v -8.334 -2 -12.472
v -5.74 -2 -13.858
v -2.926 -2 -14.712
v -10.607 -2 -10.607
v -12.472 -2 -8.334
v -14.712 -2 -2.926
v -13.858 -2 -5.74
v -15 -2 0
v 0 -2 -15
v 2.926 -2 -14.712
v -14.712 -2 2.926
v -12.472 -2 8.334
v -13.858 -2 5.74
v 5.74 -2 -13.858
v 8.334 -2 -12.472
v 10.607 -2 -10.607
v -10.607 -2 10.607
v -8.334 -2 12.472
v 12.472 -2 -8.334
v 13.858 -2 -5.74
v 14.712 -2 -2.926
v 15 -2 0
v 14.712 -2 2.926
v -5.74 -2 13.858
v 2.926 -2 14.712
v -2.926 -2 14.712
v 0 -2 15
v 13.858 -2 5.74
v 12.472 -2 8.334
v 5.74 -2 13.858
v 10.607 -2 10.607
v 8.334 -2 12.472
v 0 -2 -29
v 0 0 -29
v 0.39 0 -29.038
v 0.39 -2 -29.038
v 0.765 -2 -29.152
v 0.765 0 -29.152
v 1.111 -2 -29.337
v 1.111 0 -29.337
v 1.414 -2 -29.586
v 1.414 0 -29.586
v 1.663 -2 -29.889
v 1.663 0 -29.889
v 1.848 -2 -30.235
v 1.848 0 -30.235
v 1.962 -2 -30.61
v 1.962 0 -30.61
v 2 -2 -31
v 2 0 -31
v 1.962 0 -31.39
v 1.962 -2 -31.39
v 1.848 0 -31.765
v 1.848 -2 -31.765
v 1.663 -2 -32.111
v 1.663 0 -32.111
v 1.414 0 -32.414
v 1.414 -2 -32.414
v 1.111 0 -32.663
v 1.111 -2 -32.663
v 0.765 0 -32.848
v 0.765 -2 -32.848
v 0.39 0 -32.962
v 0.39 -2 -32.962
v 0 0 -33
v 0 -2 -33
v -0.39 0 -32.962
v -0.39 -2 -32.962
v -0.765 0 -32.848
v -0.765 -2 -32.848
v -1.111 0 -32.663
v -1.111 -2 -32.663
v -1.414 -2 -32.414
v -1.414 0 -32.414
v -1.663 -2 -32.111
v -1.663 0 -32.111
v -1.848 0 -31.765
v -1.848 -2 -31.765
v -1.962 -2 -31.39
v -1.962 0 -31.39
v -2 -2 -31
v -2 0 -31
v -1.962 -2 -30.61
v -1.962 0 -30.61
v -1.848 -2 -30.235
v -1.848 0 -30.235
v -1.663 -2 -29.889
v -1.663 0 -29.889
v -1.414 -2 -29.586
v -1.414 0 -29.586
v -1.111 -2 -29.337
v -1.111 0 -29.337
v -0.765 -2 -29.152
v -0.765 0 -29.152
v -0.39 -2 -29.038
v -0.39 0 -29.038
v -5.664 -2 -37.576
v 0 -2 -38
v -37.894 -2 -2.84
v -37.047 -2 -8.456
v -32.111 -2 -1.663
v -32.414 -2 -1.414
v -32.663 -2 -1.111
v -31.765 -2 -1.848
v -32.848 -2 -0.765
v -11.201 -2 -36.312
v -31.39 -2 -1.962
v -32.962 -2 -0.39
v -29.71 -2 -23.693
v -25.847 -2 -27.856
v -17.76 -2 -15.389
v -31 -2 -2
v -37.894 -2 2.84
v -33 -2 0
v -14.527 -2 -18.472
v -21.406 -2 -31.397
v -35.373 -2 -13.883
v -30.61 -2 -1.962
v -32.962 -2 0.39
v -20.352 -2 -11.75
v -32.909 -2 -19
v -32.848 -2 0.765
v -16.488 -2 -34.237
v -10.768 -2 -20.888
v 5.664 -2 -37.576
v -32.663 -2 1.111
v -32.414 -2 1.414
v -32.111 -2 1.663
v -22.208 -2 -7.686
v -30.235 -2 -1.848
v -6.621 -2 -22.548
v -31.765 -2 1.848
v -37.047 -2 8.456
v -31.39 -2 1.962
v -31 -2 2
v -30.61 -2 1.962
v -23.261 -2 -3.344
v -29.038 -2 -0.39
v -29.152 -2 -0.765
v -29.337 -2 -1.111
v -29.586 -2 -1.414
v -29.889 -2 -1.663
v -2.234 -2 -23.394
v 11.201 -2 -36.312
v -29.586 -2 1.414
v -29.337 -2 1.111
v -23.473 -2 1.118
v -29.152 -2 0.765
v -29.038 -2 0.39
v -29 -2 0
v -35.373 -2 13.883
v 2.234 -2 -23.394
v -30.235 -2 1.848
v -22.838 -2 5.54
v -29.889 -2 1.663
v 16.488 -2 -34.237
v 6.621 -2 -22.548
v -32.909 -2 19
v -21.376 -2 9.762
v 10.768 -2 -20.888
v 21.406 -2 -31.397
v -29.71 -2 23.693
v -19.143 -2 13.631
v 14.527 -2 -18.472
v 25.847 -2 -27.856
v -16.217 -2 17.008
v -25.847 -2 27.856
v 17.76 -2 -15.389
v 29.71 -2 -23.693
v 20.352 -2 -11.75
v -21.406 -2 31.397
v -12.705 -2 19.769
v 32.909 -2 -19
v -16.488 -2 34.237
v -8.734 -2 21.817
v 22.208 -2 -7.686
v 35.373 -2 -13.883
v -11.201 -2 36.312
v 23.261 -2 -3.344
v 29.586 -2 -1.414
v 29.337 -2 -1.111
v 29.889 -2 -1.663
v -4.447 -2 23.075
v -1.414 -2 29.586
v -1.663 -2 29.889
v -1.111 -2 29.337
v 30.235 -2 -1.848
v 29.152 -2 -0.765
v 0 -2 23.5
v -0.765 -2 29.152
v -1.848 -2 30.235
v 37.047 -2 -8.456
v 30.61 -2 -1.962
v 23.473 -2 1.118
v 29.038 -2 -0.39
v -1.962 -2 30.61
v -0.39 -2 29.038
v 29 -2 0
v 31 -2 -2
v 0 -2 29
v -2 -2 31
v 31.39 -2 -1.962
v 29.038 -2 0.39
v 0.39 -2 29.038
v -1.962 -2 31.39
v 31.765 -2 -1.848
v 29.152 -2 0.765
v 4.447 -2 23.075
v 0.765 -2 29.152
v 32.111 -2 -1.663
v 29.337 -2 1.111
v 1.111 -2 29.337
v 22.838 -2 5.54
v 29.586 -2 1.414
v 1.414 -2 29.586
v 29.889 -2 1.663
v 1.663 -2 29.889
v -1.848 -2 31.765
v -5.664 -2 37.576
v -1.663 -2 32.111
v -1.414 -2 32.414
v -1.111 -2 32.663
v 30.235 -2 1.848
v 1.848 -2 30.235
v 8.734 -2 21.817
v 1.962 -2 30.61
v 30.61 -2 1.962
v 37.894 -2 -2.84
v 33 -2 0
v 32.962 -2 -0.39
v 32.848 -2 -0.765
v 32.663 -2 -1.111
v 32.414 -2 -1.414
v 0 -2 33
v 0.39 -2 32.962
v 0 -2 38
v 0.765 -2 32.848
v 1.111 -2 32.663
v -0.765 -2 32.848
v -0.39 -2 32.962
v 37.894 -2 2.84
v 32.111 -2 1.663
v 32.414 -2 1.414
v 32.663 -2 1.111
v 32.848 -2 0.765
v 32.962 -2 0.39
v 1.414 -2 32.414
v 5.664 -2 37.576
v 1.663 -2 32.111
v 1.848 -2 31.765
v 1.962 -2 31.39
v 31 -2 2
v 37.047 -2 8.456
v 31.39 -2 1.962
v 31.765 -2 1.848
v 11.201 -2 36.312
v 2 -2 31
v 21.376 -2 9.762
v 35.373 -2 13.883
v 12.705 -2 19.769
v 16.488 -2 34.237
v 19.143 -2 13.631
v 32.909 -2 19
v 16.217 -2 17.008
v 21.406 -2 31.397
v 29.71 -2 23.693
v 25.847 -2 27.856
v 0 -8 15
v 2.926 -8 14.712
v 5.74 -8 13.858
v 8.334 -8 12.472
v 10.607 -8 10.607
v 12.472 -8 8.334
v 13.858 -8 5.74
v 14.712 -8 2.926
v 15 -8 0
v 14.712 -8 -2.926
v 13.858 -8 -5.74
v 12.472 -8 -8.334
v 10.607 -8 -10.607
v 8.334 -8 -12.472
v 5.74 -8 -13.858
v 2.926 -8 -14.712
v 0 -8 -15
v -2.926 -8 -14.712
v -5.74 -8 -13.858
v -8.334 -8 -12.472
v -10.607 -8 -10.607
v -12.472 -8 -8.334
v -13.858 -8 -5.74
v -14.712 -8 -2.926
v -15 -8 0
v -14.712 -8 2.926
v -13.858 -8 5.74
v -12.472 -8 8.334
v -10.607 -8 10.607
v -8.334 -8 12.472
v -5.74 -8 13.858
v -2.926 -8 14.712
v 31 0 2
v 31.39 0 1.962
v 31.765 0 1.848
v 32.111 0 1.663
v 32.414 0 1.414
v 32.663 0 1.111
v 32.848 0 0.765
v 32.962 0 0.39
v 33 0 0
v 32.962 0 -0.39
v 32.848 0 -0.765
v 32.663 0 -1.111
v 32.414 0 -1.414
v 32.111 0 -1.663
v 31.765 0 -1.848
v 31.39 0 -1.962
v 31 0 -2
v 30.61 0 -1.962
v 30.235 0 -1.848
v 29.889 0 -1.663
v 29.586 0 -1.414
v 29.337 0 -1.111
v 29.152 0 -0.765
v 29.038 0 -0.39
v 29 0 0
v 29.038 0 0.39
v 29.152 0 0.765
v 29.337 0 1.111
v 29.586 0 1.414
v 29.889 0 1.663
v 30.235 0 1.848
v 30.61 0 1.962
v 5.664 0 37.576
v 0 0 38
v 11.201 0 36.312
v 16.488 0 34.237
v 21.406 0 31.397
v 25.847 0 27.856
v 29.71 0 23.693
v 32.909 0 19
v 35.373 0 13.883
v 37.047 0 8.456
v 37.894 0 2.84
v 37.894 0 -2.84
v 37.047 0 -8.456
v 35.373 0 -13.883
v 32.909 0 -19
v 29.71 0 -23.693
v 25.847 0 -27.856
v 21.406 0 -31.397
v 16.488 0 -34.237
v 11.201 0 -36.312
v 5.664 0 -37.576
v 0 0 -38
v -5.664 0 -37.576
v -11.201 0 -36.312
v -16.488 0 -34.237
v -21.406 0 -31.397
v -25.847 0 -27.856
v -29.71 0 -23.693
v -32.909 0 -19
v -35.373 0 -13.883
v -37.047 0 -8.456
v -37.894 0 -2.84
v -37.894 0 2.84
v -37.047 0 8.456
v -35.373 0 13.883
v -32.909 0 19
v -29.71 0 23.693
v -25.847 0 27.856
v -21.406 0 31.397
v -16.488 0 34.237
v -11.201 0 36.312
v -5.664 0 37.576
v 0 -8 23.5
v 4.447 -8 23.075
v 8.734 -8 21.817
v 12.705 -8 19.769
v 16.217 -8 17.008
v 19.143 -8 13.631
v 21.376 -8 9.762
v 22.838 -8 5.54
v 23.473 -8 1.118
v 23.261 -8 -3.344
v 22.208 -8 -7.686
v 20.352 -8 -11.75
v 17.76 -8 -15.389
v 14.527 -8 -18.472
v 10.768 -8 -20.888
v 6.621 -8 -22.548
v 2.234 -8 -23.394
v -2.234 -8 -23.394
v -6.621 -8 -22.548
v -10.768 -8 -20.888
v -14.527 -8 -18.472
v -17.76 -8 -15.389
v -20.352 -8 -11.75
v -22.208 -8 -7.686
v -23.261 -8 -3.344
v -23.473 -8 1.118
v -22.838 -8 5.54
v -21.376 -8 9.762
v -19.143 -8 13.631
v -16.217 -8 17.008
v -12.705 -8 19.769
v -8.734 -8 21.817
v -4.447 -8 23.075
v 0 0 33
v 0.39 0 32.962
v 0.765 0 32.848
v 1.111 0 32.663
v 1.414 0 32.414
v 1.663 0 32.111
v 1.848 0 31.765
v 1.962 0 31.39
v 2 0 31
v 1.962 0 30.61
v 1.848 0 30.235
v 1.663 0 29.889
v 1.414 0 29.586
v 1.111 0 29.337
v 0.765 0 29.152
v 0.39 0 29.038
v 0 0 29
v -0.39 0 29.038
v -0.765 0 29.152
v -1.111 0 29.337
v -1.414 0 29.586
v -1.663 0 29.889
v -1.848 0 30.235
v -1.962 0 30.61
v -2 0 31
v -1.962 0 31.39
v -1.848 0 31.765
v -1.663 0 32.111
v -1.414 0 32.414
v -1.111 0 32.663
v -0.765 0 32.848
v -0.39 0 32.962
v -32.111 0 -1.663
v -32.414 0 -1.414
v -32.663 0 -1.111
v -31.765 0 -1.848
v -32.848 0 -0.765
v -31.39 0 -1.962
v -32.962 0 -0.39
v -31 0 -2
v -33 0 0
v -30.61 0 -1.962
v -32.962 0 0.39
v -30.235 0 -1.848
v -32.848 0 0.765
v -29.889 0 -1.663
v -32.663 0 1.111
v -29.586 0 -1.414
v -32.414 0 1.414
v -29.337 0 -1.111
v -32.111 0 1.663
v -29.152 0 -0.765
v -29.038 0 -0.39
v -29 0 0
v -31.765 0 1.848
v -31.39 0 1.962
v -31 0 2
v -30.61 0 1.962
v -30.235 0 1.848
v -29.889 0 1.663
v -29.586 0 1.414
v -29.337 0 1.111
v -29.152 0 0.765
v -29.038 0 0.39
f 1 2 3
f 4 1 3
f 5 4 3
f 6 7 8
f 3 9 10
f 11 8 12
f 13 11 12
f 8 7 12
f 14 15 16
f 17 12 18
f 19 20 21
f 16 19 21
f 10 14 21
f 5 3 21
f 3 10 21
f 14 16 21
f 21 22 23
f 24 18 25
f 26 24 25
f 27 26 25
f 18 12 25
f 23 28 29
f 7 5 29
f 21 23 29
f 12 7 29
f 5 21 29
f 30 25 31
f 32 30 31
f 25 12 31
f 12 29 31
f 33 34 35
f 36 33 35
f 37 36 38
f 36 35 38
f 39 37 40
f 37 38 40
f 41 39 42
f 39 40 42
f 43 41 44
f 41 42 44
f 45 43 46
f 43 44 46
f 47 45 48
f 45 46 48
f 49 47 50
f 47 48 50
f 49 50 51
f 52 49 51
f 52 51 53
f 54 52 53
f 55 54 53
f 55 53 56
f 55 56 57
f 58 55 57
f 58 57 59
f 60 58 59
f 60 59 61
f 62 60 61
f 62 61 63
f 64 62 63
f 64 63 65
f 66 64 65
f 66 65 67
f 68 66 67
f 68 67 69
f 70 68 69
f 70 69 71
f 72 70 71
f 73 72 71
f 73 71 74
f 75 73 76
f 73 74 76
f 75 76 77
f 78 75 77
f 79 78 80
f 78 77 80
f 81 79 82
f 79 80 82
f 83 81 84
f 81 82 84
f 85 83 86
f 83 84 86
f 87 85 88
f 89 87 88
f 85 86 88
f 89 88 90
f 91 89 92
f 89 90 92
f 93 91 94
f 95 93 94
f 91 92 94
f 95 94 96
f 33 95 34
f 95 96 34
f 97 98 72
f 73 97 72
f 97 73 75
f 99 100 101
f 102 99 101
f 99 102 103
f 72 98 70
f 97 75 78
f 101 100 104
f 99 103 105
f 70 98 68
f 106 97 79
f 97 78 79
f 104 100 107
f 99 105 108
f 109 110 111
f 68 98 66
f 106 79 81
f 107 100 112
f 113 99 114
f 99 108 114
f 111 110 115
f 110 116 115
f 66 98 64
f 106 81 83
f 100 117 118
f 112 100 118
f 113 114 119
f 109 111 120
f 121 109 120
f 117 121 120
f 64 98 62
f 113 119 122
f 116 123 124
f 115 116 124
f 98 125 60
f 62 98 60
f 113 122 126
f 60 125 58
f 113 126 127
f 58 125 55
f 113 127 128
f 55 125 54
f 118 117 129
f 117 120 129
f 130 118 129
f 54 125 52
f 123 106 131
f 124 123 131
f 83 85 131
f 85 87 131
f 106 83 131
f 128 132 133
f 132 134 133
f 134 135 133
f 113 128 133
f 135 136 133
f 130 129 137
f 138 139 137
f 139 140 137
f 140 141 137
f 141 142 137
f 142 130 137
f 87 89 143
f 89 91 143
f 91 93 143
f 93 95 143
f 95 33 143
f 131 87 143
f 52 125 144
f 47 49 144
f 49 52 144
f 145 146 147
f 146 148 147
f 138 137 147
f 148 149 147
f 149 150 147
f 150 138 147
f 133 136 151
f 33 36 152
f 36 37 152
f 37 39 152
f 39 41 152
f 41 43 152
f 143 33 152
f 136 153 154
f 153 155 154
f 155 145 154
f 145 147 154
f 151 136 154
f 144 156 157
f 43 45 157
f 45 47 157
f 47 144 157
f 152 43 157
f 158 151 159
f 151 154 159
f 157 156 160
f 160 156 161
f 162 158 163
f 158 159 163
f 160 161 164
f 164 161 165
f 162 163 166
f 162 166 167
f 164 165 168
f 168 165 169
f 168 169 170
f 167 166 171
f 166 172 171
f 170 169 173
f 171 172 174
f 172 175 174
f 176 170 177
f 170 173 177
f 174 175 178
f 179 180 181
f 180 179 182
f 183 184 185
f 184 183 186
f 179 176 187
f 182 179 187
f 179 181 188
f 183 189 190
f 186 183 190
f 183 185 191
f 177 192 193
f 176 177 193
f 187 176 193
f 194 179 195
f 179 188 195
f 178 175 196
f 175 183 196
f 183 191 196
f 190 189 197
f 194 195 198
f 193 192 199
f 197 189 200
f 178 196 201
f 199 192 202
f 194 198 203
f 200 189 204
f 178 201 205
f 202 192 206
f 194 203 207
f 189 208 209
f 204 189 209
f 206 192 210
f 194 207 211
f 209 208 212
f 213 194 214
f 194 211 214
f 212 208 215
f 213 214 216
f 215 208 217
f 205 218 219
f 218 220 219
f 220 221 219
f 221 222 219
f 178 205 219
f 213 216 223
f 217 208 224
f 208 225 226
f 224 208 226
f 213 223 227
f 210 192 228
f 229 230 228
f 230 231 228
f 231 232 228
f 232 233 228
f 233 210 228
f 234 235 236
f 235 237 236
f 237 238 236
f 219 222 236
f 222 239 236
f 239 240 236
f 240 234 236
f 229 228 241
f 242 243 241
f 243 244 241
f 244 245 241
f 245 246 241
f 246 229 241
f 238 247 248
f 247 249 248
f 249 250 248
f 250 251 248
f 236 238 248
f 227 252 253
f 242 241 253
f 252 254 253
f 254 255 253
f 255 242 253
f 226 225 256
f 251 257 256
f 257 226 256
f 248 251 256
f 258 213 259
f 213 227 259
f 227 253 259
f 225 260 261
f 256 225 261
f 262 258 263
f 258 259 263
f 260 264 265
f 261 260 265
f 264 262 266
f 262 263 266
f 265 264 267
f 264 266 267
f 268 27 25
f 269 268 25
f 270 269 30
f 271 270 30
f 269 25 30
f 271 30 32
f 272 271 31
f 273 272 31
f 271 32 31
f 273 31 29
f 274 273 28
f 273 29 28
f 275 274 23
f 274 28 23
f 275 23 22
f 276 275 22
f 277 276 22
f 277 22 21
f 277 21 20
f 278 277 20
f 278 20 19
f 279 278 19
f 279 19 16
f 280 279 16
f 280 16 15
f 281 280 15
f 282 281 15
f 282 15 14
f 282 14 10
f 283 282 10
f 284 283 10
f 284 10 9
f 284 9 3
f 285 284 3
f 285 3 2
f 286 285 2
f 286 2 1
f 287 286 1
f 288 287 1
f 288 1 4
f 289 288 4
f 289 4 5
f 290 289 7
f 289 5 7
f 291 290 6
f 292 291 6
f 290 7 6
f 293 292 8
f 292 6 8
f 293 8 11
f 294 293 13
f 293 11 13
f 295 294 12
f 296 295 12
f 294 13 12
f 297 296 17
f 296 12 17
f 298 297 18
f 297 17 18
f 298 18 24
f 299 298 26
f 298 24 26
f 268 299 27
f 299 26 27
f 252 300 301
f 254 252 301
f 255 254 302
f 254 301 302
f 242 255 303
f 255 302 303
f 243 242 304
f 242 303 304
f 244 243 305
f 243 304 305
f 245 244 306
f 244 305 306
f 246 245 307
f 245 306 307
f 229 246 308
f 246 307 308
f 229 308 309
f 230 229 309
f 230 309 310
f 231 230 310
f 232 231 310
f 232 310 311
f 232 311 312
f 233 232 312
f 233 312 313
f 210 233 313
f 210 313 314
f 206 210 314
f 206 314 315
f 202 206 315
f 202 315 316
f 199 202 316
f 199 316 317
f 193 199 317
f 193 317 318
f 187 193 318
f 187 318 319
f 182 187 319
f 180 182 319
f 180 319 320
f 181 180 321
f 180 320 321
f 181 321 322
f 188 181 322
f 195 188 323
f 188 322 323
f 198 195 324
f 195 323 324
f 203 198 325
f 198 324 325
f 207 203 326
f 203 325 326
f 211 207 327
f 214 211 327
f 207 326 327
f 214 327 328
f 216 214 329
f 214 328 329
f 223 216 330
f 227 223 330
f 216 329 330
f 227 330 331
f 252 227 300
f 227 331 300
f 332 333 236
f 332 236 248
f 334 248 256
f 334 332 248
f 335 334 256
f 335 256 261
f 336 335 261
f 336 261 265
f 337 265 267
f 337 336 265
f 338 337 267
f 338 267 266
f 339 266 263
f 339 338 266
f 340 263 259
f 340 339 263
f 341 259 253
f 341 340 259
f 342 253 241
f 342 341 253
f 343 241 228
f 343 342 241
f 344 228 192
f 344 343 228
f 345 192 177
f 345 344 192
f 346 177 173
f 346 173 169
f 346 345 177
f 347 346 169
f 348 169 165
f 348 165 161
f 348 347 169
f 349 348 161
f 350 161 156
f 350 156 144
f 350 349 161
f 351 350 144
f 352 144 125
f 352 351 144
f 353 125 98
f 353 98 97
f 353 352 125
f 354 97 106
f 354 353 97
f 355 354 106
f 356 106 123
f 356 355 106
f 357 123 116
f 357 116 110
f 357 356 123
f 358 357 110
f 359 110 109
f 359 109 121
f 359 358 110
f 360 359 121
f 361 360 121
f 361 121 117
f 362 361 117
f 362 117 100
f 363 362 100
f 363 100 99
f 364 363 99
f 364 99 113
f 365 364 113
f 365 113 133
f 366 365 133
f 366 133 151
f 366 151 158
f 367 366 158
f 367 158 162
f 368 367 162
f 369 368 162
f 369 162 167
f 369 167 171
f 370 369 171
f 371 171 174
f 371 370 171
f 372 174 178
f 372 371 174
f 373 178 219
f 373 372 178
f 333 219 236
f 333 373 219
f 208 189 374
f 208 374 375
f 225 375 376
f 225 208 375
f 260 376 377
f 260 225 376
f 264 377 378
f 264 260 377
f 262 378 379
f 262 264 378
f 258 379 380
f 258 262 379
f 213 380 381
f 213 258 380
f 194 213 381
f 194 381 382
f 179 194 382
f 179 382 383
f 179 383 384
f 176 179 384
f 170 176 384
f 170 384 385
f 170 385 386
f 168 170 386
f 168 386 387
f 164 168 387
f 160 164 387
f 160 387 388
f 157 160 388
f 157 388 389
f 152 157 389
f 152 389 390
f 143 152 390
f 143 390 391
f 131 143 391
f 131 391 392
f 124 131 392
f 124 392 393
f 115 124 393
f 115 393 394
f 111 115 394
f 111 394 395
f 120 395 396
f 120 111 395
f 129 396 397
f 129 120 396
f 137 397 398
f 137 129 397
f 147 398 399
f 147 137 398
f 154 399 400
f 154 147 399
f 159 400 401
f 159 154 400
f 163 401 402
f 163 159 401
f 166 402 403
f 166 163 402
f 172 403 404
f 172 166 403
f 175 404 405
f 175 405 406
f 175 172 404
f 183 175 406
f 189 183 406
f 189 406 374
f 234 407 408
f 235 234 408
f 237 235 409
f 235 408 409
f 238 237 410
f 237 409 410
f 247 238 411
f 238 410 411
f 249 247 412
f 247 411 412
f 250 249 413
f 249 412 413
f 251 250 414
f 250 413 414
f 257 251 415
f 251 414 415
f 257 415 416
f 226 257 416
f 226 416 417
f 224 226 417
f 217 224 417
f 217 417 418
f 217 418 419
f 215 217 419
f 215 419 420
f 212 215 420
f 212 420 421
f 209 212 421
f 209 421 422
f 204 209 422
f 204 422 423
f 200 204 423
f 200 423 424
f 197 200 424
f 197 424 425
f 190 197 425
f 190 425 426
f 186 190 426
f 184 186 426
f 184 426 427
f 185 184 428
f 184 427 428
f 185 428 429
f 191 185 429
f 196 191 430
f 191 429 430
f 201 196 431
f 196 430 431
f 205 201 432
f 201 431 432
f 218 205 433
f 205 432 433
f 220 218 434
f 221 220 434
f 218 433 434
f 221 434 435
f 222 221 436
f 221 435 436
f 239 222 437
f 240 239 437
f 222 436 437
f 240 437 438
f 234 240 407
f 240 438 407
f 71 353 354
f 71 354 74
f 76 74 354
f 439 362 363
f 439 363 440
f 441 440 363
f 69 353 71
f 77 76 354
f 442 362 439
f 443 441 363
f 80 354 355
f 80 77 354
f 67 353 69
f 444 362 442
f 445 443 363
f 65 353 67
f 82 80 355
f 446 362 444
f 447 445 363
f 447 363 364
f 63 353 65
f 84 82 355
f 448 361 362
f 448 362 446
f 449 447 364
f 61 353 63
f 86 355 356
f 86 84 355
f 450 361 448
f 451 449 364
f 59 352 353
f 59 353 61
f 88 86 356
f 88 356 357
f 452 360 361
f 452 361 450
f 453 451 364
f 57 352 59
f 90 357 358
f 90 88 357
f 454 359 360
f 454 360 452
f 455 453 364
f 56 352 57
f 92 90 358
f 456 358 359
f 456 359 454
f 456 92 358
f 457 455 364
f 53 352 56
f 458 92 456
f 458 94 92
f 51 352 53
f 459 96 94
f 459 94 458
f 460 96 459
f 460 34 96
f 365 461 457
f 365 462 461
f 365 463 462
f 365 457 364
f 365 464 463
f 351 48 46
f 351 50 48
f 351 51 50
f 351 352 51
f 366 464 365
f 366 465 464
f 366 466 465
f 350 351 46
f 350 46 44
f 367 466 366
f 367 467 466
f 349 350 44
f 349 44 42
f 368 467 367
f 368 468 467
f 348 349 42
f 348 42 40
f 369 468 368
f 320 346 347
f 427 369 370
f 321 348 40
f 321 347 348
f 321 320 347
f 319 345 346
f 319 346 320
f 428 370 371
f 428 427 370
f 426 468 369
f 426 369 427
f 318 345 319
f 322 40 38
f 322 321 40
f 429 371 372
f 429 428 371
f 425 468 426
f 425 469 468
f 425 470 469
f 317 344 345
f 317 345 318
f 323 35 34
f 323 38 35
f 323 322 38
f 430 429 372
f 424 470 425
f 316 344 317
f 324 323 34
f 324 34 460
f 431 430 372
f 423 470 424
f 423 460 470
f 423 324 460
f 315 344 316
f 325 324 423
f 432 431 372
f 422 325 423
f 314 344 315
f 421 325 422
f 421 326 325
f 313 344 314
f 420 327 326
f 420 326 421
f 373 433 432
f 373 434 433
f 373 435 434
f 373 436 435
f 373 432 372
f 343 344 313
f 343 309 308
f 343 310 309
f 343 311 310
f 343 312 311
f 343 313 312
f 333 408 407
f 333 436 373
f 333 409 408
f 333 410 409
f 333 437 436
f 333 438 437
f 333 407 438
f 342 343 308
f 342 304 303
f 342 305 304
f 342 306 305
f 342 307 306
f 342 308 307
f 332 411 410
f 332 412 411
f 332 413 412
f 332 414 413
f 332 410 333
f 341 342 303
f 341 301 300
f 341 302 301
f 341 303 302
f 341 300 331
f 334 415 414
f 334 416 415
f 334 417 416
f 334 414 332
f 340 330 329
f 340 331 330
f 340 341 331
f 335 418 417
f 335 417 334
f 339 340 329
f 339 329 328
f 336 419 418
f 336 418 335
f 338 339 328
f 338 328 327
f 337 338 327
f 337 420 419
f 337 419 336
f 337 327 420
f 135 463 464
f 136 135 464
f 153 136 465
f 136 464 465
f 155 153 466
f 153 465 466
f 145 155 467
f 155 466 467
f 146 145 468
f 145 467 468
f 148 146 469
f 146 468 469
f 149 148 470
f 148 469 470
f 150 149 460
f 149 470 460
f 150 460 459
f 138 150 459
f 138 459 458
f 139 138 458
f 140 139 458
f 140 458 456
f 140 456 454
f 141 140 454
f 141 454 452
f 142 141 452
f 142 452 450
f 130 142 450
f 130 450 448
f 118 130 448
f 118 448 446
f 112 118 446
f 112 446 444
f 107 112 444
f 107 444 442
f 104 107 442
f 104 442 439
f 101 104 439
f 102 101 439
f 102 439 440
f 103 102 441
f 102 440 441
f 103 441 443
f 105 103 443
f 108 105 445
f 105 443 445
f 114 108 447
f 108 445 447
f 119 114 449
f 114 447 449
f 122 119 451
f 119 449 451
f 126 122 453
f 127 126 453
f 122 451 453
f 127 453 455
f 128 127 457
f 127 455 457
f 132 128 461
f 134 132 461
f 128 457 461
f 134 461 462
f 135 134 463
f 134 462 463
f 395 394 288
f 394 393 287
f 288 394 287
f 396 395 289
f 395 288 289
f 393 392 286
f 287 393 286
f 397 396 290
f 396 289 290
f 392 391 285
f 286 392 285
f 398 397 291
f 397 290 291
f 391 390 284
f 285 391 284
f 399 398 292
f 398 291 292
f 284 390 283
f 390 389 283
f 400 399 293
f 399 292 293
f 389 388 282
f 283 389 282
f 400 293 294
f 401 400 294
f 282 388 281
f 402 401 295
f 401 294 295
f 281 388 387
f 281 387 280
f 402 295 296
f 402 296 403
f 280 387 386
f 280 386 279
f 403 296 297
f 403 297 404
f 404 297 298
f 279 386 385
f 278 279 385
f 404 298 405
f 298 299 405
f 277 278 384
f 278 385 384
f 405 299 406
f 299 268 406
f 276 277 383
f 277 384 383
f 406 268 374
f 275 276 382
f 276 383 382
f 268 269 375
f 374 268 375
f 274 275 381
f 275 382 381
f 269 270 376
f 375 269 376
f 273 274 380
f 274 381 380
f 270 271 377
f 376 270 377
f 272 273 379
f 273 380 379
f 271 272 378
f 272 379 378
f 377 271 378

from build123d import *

# Parameters (mm, degrees)
SKETCH1_R           = 23.5
BOSS_EXTRUDE1_DEPTH = 8
SKETCH2_R           = 38
BOSS_EXTRUDE2_DEPTH = 2
CUT_EXTRUDE1_START  = -2
SKETCH3_R           = 15
CUT_EXTRUDE1_DEPTH  = 53.332310829
SKETCH4_R           = 2
CUT_EXTRUDE2_DEPTH  = 55.332310829


with BuildPart() as part:
    # Sketch1 → Boss-Extrude1 (new body)
    with BuildSketch(Plane(origin=(0, 0, 0), x_dir=(1, 0, 0), z_dir=(0, 1, 0))):
        with Locations(Location((0, 0, 0), (0, 0, 270))):
            Circle(SKETCH1_R)
    extrude(amount=-BOSS_EXTRUDE1_DEPTH)

    # Sketch2 → Boss-Extrude2 (add)
    with BuildSketch(Plane(origin=(0, 0, 0), x_dir=(1, 0, 0), z_dir=(0, 1, 0))):
        with Locations(Location((0, 0, 0), (0, 0, 270))):
            Circle(SKETCH2_R)
    extrude(amount=-BOSS_EXTRUDE2_DEPTH)

    # Sketch3 → Cut-Extrude1 (cut, through all)
    with BuildSketch(Plane(origin=(0, 0, 0), x_dir=(1, 0, 0), z_dir=(0, 1, 0)).offset(CUT_EXTRUDE1_START)):
        with Locations(Location((0, 0, 0), (0, 0, 270))):
            Circle(SKETCH3_R)
    extrude(amount=-CUT_EXTRUDE1_DEPTH, mode=Mode.SUBTRACT)

    # Sketch4 → Cut-Extrude2 (cut, through all)
    with BuildSketch(Plane(origin=(0, 0, 0), x_dir=(1, 0, 0), z_dir=(0, 1, 0))):
        with Locations(Location((0, 31, 0), (0, 0, 270))):
            Circle(SKETCH4_R)
        with Locations(Location((31, 0, 0), (0, 0, 270))):
            Circle(SKETCH4_R)
        with Locations(Location((0, -31, 0), (0, 0, 270))):
            Circle(SKETCH4_R)
        with Locations(Location((-31, 0, 0), (0, 0, 270))):
            Circle(SKETCH4_R)
    extrude(amount=-CUT_EXTRUDE2_DEPTH, mode=Mode.SUBTRACT)


solid = part.part
